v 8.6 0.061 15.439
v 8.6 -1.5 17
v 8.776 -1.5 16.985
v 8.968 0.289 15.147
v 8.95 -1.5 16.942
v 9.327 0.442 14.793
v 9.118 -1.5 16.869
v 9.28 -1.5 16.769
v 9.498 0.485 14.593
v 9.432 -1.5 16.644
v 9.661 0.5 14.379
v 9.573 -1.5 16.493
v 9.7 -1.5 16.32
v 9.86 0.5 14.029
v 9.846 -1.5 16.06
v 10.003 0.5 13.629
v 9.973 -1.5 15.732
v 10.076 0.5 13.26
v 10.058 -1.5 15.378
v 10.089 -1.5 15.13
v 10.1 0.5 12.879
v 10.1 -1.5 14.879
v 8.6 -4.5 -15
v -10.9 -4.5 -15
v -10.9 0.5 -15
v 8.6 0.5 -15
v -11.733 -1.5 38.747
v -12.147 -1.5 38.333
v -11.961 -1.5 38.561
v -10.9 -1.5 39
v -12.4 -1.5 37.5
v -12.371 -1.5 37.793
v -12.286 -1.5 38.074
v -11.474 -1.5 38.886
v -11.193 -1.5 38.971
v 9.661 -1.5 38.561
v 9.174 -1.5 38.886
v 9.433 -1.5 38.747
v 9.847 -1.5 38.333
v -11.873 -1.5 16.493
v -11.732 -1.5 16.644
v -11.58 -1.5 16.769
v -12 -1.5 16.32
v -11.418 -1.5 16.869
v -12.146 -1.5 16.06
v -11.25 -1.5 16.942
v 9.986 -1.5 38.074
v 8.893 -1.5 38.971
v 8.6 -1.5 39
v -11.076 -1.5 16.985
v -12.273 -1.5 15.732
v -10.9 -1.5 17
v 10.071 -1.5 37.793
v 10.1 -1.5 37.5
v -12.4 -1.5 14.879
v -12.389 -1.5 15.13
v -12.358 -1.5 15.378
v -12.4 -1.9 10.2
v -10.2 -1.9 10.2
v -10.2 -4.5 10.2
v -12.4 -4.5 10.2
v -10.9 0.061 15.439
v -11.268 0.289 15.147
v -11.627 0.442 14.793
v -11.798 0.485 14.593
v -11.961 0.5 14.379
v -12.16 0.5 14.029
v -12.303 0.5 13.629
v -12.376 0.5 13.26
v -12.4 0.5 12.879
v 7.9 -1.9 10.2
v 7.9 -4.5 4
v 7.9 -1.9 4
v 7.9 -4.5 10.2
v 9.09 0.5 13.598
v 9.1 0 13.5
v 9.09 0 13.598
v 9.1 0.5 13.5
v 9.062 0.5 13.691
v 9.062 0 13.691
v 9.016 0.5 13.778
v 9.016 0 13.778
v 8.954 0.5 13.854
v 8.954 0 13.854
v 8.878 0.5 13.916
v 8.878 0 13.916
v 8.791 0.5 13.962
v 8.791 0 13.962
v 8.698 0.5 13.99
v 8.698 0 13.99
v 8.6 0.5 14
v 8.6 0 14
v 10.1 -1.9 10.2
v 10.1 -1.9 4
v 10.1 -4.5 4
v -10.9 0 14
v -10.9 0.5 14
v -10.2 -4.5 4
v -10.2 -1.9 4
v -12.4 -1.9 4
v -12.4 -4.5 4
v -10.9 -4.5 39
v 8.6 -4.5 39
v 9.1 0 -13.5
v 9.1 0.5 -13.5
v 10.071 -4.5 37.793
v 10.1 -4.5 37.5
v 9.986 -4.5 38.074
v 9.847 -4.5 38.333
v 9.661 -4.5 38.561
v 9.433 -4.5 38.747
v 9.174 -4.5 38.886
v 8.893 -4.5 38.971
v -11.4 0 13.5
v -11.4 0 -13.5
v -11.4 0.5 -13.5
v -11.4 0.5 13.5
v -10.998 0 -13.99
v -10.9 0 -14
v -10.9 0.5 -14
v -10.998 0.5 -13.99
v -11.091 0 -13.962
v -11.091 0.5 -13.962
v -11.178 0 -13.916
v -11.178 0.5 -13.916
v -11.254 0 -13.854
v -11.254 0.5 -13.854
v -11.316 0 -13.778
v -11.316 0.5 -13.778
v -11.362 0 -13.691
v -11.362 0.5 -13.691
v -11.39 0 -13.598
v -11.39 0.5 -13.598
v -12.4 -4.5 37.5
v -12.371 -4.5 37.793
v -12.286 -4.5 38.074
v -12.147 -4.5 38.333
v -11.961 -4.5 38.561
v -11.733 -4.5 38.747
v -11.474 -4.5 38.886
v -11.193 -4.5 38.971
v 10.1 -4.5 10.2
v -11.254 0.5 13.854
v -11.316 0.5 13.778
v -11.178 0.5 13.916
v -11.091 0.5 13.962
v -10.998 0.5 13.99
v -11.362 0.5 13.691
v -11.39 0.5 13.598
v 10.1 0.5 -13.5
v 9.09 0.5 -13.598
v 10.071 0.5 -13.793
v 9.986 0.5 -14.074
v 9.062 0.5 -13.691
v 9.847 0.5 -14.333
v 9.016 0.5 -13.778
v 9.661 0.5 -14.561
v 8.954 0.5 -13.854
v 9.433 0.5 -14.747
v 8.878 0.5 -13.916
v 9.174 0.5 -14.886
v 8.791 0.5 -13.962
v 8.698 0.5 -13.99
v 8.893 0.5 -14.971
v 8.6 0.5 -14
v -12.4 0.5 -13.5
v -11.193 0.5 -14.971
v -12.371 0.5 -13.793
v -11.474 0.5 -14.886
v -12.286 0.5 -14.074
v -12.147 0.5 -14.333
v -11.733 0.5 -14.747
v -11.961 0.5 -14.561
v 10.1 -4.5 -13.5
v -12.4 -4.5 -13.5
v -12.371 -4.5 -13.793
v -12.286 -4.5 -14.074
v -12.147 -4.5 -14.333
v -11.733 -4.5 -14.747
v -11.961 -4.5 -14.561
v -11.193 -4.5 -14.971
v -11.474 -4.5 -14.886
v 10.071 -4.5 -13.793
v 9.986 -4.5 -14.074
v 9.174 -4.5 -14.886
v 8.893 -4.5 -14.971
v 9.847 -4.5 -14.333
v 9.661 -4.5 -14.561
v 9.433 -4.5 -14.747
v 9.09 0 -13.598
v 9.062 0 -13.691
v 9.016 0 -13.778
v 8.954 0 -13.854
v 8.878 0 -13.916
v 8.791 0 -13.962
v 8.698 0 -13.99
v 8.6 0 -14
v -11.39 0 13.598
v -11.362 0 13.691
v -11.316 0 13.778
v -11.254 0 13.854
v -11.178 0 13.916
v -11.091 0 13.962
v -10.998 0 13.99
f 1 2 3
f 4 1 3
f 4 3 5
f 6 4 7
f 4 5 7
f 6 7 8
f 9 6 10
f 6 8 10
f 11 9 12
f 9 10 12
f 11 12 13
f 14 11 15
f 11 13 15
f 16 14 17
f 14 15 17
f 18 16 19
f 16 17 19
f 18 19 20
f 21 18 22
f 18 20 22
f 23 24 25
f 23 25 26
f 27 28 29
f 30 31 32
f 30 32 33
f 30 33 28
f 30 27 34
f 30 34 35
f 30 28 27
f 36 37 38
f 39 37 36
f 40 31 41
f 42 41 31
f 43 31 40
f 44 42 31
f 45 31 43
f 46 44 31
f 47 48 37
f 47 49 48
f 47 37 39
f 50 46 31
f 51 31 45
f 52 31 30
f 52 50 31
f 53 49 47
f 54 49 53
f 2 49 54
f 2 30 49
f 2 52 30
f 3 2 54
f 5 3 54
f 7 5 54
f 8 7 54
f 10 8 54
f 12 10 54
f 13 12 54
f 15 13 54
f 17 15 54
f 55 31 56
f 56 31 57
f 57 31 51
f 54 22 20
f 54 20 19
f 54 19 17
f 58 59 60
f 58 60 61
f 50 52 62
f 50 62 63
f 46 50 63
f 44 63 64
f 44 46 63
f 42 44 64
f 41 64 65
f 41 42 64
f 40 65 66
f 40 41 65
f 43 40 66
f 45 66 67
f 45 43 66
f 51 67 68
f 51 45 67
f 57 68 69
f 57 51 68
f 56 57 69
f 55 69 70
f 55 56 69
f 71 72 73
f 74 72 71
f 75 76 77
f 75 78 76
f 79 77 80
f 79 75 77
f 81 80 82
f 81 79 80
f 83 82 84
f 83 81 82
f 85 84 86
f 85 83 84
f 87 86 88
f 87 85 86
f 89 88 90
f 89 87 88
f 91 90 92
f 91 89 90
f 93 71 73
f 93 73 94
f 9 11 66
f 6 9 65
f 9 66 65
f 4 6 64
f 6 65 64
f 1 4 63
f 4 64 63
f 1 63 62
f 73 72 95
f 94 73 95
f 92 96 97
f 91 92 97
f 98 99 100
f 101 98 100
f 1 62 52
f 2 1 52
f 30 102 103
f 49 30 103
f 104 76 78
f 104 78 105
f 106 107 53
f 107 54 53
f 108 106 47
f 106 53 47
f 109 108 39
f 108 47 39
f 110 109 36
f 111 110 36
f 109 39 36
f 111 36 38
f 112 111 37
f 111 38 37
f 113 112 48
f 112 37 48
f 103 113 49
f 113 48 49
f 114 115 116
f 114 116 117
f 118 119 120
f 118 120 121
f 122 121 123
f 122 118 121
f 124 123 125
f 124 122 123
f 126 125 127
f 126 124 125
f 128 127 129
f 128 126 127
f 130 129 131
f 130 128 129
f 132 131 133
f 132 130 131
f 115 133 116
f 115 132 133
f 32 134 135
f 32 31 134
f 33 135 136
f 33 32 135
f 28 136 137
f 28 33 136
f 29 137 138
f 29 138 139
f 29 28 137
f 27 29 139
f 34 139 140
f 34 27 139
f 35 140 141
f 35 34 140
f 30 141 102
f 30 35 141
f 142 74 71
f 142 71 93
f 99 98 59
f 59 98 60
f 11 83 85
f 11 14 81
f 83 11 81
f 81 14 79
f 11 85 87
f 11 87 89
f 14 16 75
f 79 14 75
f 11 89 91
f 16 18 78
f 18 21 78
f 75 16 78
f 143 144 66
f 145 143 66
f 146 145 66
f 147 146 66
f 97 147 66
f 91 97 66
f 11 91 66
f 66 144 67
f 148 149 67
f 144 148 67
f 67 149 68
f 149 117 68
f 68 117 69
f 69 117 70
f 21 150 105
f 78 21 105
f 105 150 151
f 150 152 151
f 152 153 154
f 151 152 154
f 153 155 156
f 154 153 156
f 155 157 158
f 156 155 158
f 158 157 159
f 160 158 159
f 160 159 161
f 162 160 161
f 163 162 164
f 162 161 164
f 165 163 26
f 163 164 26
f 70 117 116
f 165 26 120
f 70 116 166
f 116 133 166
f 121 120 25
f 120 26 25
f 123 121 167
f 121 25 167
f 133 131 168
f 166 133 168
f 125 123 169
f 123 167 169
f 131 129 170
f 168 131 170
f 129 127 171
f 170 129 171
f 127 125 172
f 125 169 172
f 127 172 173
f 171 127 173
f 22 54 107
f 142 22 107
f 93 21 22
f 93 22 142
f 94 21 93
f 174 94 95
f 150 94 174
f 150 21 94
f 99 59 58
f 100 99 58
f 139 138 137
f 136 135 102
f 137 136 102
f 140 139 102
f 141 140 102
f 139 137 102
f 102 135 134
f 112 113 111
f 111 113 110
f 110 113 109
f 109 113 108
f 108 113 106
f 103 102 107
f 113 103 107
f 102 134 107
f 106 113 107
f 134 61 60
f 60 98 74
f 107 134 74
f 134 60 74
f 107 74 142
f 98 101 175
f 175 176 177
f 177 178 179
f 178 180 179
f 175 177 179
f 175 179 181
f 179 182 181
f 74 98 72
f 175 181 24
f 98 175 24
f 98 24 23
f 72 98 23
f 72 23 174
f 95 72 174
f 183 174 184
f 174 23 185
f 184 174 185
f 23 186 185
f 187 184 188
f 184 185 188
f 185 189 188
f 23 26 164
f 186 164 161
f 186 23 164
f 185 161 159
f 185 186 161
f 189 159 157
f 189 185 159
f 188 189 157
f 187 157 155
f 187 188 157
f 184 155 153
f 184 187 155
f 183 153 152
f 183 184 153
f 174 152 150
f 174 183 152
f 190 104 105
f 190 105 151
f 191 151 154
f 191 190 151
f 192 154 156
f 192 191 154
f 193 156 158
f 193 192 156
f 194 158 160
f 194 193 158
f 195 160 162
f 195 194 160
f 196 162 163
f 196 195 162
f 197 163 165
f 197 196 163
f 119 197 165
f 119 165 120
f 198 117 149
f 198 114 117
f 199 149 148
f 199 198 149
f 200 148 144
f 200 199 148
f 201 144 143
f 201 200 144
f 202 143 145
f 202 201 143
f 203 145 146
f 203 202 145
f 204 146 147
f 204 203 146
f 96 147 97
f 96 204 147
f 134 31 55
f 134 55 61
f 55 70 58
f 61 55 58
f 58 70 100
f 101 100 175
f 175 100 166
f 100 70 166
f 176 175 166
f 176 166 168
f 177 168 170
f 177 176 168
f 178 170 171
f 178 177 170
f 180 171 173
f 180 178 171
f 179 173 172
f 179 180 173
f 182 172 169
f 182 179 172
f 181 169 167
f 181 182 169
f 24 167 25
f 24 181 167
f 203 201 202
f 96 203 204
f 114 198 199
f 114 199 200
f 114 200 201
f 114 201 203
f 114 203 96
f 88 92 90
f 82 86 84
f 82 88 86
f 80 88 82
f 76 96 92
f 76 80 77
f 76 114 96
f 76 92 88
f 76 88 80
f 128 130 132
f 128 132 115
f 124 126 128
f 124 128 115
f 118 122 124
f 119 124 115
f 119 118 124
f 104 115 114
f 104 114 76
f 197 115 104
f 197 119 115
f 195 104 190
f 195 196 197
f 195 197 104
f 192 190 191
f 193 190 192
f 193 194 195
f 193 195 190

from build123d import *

# Parameters (mm, degrees)
SURFACE_SKETCH_W       = 22.5
SURFACE_SKETCH_H       = 30
BODY_DEPTH             = 4.5
SKETCH_19_W            = 22.5
SKETCH_19_H            = 24
EXTRUDE_4_DEPTH        = 3
FILLET_6_R             = 1.5
MAGNET_CUTOUT_SKETCH_W = 2.2
MAGNET_CUTOUT_SKETCH_H = 6.2
MAGNET_CUTOUT_DEPTH    = 2.6
BORDER_DEPTH           = 0.5
CHAMPFER_DEPTH         = 22.5
FILLET_7_R             = 1.5
FILLET_8_R             = 0.5
CUT_EXTRUDE_1_DEPTH    = 23.5


with BuildPart() as part:
    # surface_sketch → body (new body)
    with BuildSketch(Plane(origin=(0, 0, 0), x_dir=(1, 0, 0), z_dir=(0, 1, 0))):
        with Locations((-1.15, 0)):
            Rectangle(SURFACE_SKETCH_W, SURFACE_SKETCH_H)
    extrude(amount=-BODY_DEPTH)

    # Эскиз19 → Бобышка-Вытянуть4 (add)
    with BuildSketch(Plane(origin=(0, -4.5, 0), x_dir=(1, 0, 0), z_dir=(0, 1, 0))):
        with Locations((-1.15, -27)):
            Rectangle(SKETCH_19_W, SKETCH_19_H)
    extrude(amount=EXTRUDE_4_DEPTH)

    # Скругление6
    fillet_6_edges = [part.edges().sort_by_distance(p)[0] for p in [
        (-12.4, -3, 39),
        (10.1, -3, 39),
        (10.1, -2.25, -15),
        (-12.4, -2.25, -15),
    ]]
    fillet(fillet_6_edges, radius=FILLET_6_R)

    # magnet_cutout_sketch → magnet_cutout (cut)
    with BuildSketch(Plane.XZ.offset(4.5)):
        with Locations((9, 7.1)):
            Rectangle(MAGNET_CUTOUT_SKETCH_W, MAGNET_CUTOUT_SKETCH_H)
    magnet_cutout = extrude(amount=-MAGNET_CUTOUT_DEPTH, mode=Mode.SUBTRACT)

    # magnet_cutout_mirror: magnet_cutout across plane
    add(magnet_cutout.mirror(Plane(origin=(-1.15, 0, 0), x_dir=(0, 0, 1), z_dir=(1, 0, 0))), mode=Mode.SUBTRACT)

    # border_sketch → border (add)
    with BuildSketch(Plane(origin=(0, 0, 0), x_dir=(1, 0, 0), z_dir=(0, 1, 0))):
        with BuildLine():
            Line((-12.4, -15), (-12.4, 13.5))
            ThreePointArc((-12.4, 13.5), (-11.960660172, 14.560660172), (-10.9, 15))
            Line((-10.9, 15), (8.6, 15))
            ThreePointArc((8.6, 15), (9.660660172, 14.560660172), (10.1, 13.5))
            Line((10.1, 13.5), (10.1, -15))
            Line((10.1, -15), (9.1, -15))
            Line((9.1, -15), (9.1, 13.5))
            ThreePointArc((9.1, 13.5), (8.953553391, 13.853553391), (8.6, 14))
            Line((8.6, 14), (-10.9, 14))
            ThreePointArc((-10.9, 14), (-11.253553391, 13.853553391), (-11.4, 13.5))
            Line((-11.4, 13.5), (-11.4, -15))
            Line((-11.4, -15), (-12.4, -15))
        make_face()
    extrude(amount=BORDER_DEPTH)

    # Эскиз21 → champfer (add)
    with BuildSketch(Plane.ZY.offset(12.4)):
        Polygon((15, 0.5), (17, -1.5), (15, -1.5), (14, -1.5), (14, 0.5), align=None)
    extrude(amount=-CHAMPFER_DEPTH)

    # Скругление7
    fillet_7_edges = [part.edges().sort_by_distance(p)[0] for p in [
        (-12.4, -0.5, 16),
        (10.1, -0.5, 16),
    ]]
    fillet(fillet_7_edges, radius=FILLET_7_R)

    # Скругление8
    fillet_8_edges = [part.edges().sort_by_distance(p)[0] for p in [
        (9.1, 0.25, 14),
        (-11.4, 0.25, 14),
    ]]
    fillet(fillet_8_edges, radius=FILLET_8_R)

    # Эскиз22 → Вырез-Вытянуть1 (cut, through all)
    with BuildSketch(Plane.ZY.offset(12.4)):
        with BuildLine():
            Line((12.878679656, 0.5), (14.378679656, 0.5))
            ThreePointArc((14.378679656, 0.5), (14.952704805, 0.385819299), (15.439339828, 0.060660172))
            Line((15.439339828, 0.060660172), (17, -1.5))
            Line((17, -1.5), (17.923275361, -1.5))
            Line((17.923275361, -1.5), (15.181180077, 1.242095285))
            Line((15.181180077, 1.242095285), (12.878679656, 1.122407091))
            Line((12.878679656, 1.122407091), (12.878679656, 0.5))
        make_face()
    extrude(amount=-CUT_EXTRUDE_1_DEPTH, mode=Mode.SUBTRACT)


solid = part.part
